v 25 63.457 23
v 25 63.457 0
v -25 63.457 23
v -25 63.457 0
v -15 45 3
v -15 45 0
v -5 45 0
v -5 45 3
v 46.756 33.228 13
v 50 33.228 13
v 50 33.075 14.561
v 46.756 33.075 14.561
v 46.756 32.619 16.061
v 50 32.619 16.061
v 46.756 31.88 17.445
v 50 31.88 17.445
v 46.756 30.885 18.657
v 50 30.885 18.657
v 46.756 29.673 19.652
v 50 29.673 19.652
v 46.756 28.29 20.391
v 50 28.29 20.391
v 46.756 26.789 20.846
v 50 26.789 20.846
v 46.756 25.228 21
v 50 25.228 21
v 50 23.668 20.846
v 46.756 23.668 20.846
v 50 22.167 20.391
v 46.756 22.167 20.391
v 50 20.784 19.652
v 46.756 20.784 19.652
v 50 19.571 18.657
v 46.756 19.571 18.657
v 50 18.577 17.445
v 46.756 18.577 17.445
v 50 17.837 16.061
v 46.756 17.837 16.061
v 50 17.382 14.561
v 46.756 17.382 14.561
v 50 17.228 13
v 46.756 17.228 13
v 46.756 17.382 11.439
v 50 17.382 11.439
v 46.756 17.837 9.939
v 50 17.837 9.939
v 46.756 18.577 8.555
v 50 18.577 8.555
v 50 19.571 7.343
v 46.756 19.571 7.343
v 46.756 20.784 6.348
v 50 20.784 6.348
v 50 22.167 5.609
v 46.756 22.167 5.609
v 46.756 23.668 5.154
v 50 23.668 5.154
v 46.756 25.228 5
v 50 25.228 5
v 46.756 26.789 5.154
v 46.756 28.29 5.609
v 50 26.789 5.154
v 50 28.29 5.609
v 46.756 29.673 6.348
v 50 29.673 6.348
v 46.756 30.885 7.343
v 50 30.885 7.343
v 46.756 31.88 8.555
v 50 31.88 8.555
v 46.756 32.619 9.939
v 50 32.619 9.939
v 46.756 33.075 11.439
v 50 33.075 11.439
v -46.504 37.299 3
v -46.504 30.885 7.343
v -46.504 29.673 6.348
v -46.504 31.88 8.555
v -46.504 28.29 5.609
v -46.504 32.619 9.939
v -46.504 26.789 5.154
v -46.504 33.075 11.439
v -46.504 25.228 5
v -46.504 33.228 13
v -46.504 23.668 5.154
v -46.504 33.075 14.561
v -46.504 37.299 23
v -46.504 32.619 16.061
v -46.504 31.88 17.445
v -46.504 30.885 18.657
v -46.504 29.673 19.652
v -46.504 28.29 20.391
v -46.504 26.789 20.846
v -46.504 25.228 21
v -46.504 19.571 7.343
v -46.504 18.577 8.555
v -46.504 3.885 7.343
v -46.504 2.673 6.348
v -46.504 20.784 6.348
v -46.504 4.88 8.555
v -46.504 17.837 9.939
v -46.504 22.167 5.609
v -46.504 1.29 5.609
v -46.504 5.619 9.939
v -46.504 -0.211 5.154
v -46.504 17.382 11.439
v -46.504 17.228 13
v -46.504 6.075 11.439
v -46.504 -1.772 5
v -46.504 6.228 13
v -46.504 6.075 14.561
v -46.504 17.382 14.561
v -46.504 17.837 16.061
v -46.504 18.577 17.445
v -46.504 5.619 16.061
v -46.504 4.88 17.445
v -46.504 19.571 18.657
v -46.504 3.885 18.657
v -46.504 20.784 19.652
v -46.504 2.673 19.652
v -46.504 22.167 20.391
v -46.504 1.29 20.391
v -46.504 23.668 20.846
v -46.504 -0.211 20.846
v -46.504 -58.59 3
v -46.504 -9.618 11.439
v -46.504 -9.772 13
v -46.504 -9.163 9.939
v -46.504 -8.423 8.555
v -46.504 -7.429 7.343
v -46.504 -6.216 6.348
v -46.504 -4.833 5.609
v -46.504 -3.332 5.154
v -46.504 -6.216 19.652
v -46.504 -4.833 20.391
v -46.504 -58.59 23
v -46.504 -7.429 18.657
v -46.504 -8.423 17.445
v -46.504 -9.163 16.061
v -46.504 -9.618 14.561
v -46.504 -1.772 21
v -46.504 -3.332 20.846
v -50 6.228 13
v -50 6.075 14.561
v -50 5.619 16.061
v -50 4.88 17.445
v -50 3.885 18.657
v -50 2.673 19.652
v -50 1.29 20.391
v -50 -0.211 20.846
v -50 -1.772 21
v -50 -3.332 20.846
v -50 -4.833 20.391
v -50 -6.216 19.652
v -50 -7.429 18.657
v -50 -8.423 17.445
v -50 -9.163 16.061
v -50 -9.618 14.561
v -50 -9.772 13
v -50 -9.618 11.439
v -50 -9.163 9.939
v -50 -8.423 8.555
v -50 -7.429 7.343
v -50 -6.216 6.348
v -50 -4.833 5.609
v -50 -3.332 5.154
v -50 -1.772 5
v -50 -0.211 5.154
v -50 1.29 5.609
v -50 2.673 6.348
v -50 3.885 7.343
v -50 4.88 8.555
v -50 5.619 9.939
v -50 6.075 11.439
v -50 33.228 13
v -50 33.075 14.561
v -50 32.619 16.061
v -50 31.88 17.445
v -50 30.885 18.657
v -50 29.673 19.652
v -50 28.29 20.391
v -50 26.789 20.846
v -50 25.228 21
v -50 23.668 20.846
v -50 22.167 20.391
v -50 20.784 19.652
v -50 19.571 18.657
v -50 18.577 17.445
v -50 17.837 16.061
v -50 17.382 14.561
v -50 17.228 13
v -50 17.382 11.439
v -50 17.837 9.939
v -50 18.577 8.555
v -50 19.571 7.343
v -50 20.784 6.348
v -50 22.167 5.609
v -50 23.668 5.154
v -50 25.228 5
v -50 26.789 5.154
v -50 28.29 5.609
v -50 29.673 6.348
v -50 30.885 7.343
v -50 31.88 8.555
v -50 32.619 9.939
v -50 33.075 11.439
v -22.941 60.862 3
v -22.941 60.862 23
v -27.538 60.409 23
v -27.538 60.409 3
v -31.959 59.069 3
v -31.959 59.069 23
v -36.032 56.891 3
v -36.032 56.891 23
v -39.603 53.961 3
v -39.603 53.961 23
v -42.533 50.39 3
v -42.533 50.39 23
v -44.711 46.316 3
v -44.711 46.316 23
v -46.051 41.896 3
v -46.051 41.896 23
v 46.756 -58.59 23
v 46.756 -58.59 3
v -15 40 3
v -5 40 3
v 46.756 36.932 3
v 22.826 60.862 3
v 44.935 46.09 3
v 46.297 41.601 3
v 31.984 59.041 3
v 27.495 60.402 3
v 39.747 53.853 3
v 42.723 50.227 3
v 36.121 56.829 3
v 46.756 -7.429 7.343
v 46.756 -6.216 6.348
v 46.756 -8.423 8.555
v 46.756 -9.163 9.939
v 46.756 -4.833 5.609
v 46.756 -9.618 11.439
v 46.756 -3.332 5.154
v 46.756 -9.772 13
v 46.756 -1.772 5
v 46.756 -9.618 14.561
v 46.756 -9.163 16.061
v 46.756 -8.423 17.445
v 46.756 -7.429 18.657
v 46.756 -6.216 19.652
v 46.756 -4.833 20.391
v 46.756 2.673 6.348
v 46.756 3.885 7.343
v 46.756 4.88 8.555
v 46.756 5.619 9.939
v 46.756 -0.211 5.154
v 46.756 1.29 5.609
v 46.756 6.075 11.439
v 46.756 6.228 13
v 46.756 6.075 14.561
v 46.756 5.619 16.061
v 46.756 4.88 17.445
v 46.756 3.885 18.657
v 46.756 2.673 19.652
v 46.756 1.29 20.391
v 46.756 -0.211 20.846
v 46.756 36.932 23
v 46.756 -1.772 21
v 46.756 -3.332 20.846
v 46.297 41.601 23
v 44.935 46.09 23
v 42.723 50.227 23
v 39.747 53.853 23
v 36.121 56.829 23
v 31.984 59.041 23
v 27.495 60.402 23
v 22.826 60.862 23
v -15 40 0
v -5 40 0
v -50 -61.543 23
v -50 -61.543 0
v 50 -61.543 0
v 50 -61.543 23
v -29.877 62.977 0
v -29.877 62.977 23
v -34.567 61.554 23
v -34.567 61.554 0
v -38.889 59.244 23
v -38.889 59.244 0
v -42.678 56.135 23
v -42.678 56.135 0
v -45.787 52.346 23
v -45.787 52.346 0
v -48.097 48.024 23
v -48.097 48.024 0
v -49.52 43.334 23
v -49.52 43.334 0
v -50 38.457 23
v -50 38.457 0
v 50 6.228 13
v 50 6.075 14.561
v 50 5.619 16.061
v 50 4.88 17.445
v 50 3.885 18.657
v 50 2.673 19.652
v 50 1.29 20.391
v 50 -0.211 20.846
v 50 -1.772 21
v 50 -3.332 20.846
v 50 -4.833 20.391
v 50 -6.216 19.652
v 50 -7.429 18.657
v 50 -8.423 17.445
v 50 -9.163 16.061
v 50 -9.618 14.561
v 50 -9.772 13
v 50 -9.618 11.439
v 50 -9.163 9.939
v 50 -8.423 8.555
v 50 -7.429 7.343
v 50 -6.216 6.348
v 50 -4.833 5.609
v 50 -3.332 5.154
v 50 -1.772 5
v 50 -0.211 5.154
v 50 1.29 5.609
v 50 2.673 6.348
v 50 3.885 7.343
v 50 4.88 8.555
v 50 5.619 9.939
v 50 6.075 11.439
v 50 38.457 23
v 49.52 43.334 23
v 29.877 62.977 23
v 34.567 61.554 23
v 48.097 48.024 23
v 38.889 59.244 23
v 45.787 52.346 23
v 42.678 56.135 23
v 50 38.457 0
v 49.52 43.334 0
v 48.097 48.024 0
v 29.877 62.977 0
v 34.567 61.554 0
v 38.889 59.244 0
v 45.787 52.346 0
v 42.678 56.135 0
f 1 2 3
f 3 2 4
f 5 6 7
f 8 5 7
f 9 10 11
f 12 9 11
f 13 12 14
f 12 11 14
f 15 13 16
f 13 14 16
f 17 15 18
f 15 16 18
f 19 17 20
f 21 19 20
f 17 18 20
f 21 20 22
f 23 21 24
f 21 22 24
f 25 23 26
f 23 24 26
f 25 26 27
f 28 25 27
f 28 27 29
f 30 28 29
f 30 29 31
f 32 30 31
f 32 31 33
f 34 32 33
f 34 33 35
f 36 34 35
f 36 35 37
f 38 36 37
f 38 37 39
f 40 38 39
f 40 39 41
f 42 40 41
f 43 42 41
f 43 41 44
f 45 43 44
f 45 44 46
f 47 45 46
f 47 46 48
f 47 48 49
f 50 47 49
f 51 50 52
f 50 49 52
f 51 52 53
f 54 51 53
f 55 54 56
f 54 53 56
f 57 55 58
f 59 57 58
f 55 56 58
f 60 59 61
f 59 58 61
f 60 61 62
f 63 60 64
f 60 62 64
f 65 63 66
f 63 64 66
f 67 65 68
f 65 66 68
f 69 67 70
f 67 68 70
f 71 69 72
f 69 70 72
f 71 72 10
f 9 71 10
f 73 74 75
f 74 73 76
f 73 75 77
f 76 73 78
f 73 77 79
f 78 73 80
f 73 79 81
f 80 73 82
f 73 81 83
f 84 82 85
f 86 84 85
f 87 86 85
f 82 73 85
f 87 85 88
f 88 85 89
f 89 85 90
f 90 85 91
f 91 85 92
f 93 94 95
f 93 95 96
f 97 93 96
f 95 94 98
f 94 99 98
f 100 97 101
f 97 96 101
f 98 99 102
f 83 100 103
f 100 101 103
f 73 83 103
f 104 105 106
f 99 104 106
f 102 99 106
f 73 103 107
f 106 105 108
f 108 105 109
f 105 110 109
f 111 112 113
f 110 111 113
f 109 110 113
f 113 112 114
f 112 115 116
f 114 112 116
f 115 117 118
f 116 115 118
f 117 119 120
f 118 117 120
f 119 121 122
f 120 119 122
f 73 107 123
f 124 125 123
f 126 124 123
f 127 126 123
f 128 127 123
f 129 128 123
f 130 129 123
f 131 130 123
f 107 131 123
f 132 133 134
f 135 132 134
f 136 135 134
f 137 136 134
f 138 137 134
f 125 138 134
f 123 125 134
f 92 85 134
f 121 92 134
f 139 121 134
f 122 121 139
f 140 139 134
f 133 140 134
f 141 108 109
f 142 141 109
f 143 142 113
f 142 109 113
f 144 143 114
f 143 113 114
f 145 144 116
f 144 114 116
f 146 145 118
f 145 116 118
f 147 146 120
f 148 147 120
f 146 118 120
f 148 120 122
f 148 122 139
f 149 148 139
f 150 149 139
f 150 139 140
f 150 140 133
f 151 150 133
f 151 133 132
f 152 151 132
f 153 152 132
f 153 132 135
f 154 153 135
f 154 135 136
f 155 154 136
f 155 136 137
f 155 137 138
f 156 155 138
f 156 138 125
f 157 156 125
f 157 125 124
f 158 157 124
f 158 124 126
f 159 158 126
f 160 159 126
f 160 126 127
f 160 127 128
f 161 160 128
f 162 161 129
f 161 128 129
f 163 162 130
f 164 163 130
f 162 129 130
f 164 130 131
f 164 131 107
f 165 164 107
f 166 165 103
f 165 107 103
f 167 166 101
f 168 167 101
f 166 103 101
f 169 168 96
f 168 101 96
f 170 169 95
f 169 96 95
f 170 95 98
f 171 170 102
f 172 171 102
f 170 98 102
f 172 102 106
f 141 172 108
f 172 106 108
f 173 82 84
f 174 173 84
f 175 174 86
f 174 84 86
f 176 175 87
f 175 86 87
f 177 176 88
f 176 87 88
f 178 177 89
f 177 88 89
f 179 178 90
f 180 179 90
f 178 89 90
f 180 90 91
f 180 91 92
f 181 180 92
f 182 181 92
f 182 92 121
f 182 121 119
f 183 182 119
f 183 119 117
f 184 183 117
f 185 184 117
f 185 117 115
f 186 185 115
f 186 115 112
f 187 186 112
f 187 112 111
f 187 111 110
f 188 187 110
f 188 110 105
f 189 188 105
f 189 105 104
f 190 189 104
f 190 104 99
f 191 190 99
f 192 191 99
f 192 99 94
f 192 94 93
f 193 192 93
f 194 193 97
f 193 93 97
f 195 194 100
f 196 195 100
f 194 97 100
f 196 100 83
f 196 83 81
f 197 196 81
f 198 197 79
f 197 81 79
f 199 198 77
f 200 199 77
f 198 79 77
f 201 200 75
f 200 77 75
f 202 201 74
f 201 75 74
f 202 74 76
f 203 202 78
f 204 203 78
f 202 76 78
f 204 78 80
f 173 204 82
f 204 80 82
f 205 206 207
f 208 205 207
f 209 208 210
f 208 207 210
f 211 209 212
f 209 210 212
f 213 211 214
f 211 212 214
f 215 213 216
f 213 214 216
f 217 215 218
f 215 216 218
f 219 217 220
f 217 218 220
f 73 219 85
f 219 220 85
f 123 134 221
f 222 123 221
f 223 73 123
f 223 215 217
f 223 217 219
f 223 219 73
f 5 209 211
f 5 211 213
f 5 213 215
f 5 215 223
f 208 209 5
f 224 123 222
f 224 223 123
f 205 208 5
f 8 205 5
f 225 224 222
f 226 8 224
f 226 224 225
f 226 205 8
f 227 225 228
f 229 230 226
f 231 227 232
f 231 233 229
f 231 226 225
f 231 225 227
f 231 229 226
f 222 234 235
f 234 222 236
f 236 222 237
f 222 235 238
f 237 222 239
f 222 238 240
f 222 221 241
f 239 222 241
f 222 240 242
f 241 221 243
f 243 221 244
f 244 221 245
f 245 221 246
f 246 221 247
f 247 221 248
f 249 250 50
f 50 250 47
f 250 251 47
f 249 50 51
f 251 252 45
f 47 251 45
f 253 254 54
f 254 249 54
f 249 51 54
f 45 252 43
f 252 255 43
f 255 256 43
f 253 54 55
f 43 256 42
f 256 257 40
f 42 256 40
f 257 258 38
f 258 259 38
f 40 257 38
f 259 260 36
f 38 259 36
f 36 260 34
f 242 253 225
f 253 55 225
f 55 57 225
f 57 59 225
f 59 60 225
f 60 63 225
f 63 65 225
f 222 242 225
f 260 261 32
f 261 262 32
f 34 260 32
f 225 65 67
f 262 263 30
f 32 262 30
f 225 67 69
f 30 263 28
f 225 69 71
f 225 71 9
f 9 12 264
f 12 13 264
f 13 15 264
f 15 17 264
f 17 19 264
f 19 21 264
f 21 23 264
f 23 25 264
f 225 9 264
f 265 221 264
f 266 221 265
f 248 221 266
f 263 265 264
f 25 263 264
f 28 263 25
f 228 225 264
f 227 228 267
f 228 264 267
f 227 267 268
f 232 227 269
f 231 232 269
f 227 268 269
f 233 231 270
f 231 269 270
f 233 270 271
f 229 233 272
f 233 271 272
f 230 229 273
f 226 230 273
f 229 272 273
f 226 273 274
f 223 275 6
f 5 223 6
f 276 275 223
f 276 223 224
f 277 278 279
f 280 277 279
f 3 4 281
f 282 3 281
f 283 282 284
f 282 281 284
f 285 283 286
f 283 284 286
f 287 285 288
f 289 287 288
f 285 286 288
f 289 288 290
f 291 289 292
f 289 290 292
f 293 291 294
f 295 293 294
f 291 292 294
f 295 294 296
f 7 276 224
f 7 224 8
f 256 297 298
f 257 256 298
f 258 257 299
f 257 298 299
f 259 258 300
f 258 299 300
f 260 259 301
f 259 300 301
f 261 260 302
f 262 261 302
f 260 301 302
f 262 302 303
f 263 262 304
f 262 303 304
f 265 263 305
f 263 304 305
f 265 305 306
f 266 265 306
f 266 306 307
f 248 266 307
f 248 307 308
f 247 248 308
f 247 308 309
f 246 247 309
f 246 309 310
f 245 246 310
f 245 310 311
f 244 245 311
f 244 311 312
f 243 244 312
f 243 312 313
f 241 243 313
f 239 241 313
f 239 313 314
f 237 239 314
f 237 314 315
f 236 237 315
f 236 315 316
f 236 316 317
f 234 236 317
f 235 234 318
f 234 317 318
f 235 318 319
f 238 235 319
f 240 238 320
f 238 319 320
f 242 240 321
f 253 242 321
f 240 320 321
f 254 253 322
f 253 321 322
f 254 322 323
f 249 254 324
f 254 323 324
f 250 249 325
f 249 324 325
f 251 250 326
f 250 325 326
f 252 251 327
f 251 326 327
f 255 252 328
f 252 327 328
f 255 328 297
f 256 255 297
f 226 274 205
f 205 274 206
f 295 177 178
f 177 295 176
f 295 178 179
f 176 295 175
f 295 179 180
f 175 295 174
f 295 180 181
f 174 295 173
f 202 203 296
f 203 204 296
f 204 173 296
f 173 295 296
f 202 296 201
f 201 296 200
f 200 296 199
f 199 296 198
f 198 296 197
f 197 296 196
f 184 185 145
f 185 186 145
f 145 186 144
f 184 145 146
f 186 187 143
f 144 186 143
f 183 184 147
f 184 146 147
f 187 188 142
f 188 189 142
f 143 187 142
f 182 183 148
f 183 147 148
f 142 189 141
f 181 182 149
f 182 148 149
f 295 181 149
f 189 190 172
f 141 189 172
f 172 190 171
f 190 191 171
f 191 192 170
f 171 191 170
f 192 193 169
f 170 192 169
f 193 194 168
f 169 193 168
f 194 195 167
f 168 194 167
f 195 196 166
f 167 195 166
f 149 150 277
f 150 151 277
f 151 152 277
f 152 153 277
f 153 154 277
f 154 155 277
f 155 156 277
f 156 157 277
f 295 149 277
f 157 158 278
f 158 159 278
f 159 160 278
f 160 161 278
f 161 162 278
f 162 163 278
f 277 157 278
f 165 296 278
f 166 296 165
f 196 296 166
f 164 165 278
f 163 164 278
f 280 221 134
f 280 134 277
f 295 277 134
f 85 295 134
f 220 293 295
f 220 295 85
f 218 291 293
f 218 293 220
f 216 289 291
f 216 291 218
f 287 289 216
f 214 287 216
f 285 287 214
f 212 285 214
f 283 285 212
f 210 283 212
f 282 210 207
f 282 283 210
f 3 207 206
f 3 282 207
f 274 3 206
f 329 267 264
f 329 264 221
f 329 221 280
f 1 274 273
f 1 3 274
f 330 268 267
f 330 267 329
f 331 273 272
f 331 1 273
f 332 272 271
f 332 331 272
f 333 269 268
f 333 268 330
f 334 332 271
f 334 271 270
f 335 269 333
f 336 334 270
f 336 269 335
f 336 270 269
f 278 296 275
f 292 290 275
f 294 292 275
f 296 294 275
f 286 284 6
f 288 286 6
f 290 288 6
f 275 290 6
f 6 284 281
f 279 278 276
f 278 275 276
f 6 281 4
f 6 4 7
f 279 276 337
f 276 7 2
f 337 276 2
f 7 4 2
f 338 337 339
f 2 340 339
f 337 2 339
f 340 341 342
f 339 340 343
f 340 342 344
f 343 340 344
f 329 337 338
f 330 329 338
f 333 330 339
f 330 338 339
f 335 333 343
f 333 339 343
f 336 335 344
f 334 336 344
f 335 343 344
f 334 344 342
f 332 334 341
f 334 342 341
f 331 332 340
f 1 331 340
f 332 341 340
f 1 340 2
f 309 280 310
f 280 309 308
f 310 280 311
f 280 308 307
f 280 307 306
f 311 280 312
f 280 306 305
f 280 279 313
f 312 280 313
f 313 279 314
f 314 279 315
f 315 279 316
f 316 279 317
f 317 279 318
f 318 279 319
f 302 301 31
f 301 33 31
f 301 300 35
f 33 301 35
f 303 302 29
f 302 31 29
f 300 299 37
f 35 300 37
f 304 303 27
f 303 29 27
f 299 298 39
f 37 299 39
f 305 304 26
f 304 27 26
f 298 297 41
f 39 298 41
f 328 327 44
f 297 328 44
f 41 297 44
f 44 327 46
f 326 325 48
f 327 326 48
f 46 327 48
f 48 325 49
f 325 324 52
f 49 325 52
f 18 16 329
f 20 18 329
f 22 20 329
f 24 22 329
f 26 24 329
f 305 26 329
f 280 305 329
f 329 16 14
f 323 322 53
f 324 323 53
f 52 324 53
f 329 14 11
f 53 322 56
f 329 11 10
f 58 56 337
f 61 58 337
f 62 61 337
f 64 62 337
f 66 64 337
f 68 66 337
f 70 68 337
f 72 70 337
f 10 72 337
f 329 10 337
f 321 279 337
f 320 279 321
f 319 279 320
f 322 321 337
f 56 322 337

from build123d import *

# Parameters (mm, degrees)
BOX008_W        = 10
BOX008_H        = 5
BOX008_DEPTH    = 10
PAD_DEPTH       = 23
POCKET_DEPTH    = 20
SKETCH002_R     = 8
POCKET001_DEPTH = 100.001


with BuildPart() as cube008:
    # Box008 → Box008 (new body)
    with BuildSketch(Plane(origin=(-15, 40, -4), x_dir=(1, 0, 0), z_dir=(0, 0, 1))):
        with Locations((5, 2.5)):
            Rectangle(BOX008_W, BOX008_H)
    extrude(amount=BOX008_DEPTH)


with BuildPart() as cut012:
    # Sketch → Pad (new body)
    with BuildSketch(Plane.XY):
        with BuildLine():
            Line((-50, 38.45712), (-50, -61.54288))
            Line((-50, -61.54288), (50, -61.54288))
            Line((50, -61.54288), (50, 38.45712))
            ThreePointArc((50, 38.45712), (42.67767, 56.13479), (25, 63.45712))
            Line((25, 63.45712), (-25, 63.45712))
            ThreePointArc((-25, 63.45712), (-42.67767, 56.13479), (-50, 38.45712))
        make_face()
    extrude(amount=PAD_DEPTH)

    # Sketch001 → Pocket (cut)
    with BuildSketch(Plane.XY.offset(23)):
        with BuildLine():
            Line((-46.504223, 37.299377), (-46.504223, -58.589802))
            Line((-46.504223, -58.589802), (46.756358, -58.589802))
            Line((46.756358, -58.589802), (46.756358, 36.931984))
            ThreePointArc((46.756358, 36.931984), (39.747359, 53.853203), (22.82614, 60.862202))
            Line((22.82614, 60.862202), (-22.941398, 60.862202))
            ThreePointArc((-22.941398, 60.862202), (-39.602831, 53.96081), (-46.504223, 37.299377))
        make_face()
    extrude(amount=-POCKET_DEPTH, mode=Mode.SUBTRACT)

    # Sketch002 → Pocket001 (cut, through all)
    with BuildSketch(Plane.YZ.offset(50)):
        with Locations((-1.771652, 13)):
            Circle(SKETCH002_R)
        with Locations((25.228348, 13)):
            Circle(SKETCH002_R)
    extrude(amount=-POCKET001_DEPTH, mode=Mode.SUBTRACT)

    # Cut012: cut Cube008
    add(cube008.part, mode=Mode.SUBTRACT)


solid = cut012.part
